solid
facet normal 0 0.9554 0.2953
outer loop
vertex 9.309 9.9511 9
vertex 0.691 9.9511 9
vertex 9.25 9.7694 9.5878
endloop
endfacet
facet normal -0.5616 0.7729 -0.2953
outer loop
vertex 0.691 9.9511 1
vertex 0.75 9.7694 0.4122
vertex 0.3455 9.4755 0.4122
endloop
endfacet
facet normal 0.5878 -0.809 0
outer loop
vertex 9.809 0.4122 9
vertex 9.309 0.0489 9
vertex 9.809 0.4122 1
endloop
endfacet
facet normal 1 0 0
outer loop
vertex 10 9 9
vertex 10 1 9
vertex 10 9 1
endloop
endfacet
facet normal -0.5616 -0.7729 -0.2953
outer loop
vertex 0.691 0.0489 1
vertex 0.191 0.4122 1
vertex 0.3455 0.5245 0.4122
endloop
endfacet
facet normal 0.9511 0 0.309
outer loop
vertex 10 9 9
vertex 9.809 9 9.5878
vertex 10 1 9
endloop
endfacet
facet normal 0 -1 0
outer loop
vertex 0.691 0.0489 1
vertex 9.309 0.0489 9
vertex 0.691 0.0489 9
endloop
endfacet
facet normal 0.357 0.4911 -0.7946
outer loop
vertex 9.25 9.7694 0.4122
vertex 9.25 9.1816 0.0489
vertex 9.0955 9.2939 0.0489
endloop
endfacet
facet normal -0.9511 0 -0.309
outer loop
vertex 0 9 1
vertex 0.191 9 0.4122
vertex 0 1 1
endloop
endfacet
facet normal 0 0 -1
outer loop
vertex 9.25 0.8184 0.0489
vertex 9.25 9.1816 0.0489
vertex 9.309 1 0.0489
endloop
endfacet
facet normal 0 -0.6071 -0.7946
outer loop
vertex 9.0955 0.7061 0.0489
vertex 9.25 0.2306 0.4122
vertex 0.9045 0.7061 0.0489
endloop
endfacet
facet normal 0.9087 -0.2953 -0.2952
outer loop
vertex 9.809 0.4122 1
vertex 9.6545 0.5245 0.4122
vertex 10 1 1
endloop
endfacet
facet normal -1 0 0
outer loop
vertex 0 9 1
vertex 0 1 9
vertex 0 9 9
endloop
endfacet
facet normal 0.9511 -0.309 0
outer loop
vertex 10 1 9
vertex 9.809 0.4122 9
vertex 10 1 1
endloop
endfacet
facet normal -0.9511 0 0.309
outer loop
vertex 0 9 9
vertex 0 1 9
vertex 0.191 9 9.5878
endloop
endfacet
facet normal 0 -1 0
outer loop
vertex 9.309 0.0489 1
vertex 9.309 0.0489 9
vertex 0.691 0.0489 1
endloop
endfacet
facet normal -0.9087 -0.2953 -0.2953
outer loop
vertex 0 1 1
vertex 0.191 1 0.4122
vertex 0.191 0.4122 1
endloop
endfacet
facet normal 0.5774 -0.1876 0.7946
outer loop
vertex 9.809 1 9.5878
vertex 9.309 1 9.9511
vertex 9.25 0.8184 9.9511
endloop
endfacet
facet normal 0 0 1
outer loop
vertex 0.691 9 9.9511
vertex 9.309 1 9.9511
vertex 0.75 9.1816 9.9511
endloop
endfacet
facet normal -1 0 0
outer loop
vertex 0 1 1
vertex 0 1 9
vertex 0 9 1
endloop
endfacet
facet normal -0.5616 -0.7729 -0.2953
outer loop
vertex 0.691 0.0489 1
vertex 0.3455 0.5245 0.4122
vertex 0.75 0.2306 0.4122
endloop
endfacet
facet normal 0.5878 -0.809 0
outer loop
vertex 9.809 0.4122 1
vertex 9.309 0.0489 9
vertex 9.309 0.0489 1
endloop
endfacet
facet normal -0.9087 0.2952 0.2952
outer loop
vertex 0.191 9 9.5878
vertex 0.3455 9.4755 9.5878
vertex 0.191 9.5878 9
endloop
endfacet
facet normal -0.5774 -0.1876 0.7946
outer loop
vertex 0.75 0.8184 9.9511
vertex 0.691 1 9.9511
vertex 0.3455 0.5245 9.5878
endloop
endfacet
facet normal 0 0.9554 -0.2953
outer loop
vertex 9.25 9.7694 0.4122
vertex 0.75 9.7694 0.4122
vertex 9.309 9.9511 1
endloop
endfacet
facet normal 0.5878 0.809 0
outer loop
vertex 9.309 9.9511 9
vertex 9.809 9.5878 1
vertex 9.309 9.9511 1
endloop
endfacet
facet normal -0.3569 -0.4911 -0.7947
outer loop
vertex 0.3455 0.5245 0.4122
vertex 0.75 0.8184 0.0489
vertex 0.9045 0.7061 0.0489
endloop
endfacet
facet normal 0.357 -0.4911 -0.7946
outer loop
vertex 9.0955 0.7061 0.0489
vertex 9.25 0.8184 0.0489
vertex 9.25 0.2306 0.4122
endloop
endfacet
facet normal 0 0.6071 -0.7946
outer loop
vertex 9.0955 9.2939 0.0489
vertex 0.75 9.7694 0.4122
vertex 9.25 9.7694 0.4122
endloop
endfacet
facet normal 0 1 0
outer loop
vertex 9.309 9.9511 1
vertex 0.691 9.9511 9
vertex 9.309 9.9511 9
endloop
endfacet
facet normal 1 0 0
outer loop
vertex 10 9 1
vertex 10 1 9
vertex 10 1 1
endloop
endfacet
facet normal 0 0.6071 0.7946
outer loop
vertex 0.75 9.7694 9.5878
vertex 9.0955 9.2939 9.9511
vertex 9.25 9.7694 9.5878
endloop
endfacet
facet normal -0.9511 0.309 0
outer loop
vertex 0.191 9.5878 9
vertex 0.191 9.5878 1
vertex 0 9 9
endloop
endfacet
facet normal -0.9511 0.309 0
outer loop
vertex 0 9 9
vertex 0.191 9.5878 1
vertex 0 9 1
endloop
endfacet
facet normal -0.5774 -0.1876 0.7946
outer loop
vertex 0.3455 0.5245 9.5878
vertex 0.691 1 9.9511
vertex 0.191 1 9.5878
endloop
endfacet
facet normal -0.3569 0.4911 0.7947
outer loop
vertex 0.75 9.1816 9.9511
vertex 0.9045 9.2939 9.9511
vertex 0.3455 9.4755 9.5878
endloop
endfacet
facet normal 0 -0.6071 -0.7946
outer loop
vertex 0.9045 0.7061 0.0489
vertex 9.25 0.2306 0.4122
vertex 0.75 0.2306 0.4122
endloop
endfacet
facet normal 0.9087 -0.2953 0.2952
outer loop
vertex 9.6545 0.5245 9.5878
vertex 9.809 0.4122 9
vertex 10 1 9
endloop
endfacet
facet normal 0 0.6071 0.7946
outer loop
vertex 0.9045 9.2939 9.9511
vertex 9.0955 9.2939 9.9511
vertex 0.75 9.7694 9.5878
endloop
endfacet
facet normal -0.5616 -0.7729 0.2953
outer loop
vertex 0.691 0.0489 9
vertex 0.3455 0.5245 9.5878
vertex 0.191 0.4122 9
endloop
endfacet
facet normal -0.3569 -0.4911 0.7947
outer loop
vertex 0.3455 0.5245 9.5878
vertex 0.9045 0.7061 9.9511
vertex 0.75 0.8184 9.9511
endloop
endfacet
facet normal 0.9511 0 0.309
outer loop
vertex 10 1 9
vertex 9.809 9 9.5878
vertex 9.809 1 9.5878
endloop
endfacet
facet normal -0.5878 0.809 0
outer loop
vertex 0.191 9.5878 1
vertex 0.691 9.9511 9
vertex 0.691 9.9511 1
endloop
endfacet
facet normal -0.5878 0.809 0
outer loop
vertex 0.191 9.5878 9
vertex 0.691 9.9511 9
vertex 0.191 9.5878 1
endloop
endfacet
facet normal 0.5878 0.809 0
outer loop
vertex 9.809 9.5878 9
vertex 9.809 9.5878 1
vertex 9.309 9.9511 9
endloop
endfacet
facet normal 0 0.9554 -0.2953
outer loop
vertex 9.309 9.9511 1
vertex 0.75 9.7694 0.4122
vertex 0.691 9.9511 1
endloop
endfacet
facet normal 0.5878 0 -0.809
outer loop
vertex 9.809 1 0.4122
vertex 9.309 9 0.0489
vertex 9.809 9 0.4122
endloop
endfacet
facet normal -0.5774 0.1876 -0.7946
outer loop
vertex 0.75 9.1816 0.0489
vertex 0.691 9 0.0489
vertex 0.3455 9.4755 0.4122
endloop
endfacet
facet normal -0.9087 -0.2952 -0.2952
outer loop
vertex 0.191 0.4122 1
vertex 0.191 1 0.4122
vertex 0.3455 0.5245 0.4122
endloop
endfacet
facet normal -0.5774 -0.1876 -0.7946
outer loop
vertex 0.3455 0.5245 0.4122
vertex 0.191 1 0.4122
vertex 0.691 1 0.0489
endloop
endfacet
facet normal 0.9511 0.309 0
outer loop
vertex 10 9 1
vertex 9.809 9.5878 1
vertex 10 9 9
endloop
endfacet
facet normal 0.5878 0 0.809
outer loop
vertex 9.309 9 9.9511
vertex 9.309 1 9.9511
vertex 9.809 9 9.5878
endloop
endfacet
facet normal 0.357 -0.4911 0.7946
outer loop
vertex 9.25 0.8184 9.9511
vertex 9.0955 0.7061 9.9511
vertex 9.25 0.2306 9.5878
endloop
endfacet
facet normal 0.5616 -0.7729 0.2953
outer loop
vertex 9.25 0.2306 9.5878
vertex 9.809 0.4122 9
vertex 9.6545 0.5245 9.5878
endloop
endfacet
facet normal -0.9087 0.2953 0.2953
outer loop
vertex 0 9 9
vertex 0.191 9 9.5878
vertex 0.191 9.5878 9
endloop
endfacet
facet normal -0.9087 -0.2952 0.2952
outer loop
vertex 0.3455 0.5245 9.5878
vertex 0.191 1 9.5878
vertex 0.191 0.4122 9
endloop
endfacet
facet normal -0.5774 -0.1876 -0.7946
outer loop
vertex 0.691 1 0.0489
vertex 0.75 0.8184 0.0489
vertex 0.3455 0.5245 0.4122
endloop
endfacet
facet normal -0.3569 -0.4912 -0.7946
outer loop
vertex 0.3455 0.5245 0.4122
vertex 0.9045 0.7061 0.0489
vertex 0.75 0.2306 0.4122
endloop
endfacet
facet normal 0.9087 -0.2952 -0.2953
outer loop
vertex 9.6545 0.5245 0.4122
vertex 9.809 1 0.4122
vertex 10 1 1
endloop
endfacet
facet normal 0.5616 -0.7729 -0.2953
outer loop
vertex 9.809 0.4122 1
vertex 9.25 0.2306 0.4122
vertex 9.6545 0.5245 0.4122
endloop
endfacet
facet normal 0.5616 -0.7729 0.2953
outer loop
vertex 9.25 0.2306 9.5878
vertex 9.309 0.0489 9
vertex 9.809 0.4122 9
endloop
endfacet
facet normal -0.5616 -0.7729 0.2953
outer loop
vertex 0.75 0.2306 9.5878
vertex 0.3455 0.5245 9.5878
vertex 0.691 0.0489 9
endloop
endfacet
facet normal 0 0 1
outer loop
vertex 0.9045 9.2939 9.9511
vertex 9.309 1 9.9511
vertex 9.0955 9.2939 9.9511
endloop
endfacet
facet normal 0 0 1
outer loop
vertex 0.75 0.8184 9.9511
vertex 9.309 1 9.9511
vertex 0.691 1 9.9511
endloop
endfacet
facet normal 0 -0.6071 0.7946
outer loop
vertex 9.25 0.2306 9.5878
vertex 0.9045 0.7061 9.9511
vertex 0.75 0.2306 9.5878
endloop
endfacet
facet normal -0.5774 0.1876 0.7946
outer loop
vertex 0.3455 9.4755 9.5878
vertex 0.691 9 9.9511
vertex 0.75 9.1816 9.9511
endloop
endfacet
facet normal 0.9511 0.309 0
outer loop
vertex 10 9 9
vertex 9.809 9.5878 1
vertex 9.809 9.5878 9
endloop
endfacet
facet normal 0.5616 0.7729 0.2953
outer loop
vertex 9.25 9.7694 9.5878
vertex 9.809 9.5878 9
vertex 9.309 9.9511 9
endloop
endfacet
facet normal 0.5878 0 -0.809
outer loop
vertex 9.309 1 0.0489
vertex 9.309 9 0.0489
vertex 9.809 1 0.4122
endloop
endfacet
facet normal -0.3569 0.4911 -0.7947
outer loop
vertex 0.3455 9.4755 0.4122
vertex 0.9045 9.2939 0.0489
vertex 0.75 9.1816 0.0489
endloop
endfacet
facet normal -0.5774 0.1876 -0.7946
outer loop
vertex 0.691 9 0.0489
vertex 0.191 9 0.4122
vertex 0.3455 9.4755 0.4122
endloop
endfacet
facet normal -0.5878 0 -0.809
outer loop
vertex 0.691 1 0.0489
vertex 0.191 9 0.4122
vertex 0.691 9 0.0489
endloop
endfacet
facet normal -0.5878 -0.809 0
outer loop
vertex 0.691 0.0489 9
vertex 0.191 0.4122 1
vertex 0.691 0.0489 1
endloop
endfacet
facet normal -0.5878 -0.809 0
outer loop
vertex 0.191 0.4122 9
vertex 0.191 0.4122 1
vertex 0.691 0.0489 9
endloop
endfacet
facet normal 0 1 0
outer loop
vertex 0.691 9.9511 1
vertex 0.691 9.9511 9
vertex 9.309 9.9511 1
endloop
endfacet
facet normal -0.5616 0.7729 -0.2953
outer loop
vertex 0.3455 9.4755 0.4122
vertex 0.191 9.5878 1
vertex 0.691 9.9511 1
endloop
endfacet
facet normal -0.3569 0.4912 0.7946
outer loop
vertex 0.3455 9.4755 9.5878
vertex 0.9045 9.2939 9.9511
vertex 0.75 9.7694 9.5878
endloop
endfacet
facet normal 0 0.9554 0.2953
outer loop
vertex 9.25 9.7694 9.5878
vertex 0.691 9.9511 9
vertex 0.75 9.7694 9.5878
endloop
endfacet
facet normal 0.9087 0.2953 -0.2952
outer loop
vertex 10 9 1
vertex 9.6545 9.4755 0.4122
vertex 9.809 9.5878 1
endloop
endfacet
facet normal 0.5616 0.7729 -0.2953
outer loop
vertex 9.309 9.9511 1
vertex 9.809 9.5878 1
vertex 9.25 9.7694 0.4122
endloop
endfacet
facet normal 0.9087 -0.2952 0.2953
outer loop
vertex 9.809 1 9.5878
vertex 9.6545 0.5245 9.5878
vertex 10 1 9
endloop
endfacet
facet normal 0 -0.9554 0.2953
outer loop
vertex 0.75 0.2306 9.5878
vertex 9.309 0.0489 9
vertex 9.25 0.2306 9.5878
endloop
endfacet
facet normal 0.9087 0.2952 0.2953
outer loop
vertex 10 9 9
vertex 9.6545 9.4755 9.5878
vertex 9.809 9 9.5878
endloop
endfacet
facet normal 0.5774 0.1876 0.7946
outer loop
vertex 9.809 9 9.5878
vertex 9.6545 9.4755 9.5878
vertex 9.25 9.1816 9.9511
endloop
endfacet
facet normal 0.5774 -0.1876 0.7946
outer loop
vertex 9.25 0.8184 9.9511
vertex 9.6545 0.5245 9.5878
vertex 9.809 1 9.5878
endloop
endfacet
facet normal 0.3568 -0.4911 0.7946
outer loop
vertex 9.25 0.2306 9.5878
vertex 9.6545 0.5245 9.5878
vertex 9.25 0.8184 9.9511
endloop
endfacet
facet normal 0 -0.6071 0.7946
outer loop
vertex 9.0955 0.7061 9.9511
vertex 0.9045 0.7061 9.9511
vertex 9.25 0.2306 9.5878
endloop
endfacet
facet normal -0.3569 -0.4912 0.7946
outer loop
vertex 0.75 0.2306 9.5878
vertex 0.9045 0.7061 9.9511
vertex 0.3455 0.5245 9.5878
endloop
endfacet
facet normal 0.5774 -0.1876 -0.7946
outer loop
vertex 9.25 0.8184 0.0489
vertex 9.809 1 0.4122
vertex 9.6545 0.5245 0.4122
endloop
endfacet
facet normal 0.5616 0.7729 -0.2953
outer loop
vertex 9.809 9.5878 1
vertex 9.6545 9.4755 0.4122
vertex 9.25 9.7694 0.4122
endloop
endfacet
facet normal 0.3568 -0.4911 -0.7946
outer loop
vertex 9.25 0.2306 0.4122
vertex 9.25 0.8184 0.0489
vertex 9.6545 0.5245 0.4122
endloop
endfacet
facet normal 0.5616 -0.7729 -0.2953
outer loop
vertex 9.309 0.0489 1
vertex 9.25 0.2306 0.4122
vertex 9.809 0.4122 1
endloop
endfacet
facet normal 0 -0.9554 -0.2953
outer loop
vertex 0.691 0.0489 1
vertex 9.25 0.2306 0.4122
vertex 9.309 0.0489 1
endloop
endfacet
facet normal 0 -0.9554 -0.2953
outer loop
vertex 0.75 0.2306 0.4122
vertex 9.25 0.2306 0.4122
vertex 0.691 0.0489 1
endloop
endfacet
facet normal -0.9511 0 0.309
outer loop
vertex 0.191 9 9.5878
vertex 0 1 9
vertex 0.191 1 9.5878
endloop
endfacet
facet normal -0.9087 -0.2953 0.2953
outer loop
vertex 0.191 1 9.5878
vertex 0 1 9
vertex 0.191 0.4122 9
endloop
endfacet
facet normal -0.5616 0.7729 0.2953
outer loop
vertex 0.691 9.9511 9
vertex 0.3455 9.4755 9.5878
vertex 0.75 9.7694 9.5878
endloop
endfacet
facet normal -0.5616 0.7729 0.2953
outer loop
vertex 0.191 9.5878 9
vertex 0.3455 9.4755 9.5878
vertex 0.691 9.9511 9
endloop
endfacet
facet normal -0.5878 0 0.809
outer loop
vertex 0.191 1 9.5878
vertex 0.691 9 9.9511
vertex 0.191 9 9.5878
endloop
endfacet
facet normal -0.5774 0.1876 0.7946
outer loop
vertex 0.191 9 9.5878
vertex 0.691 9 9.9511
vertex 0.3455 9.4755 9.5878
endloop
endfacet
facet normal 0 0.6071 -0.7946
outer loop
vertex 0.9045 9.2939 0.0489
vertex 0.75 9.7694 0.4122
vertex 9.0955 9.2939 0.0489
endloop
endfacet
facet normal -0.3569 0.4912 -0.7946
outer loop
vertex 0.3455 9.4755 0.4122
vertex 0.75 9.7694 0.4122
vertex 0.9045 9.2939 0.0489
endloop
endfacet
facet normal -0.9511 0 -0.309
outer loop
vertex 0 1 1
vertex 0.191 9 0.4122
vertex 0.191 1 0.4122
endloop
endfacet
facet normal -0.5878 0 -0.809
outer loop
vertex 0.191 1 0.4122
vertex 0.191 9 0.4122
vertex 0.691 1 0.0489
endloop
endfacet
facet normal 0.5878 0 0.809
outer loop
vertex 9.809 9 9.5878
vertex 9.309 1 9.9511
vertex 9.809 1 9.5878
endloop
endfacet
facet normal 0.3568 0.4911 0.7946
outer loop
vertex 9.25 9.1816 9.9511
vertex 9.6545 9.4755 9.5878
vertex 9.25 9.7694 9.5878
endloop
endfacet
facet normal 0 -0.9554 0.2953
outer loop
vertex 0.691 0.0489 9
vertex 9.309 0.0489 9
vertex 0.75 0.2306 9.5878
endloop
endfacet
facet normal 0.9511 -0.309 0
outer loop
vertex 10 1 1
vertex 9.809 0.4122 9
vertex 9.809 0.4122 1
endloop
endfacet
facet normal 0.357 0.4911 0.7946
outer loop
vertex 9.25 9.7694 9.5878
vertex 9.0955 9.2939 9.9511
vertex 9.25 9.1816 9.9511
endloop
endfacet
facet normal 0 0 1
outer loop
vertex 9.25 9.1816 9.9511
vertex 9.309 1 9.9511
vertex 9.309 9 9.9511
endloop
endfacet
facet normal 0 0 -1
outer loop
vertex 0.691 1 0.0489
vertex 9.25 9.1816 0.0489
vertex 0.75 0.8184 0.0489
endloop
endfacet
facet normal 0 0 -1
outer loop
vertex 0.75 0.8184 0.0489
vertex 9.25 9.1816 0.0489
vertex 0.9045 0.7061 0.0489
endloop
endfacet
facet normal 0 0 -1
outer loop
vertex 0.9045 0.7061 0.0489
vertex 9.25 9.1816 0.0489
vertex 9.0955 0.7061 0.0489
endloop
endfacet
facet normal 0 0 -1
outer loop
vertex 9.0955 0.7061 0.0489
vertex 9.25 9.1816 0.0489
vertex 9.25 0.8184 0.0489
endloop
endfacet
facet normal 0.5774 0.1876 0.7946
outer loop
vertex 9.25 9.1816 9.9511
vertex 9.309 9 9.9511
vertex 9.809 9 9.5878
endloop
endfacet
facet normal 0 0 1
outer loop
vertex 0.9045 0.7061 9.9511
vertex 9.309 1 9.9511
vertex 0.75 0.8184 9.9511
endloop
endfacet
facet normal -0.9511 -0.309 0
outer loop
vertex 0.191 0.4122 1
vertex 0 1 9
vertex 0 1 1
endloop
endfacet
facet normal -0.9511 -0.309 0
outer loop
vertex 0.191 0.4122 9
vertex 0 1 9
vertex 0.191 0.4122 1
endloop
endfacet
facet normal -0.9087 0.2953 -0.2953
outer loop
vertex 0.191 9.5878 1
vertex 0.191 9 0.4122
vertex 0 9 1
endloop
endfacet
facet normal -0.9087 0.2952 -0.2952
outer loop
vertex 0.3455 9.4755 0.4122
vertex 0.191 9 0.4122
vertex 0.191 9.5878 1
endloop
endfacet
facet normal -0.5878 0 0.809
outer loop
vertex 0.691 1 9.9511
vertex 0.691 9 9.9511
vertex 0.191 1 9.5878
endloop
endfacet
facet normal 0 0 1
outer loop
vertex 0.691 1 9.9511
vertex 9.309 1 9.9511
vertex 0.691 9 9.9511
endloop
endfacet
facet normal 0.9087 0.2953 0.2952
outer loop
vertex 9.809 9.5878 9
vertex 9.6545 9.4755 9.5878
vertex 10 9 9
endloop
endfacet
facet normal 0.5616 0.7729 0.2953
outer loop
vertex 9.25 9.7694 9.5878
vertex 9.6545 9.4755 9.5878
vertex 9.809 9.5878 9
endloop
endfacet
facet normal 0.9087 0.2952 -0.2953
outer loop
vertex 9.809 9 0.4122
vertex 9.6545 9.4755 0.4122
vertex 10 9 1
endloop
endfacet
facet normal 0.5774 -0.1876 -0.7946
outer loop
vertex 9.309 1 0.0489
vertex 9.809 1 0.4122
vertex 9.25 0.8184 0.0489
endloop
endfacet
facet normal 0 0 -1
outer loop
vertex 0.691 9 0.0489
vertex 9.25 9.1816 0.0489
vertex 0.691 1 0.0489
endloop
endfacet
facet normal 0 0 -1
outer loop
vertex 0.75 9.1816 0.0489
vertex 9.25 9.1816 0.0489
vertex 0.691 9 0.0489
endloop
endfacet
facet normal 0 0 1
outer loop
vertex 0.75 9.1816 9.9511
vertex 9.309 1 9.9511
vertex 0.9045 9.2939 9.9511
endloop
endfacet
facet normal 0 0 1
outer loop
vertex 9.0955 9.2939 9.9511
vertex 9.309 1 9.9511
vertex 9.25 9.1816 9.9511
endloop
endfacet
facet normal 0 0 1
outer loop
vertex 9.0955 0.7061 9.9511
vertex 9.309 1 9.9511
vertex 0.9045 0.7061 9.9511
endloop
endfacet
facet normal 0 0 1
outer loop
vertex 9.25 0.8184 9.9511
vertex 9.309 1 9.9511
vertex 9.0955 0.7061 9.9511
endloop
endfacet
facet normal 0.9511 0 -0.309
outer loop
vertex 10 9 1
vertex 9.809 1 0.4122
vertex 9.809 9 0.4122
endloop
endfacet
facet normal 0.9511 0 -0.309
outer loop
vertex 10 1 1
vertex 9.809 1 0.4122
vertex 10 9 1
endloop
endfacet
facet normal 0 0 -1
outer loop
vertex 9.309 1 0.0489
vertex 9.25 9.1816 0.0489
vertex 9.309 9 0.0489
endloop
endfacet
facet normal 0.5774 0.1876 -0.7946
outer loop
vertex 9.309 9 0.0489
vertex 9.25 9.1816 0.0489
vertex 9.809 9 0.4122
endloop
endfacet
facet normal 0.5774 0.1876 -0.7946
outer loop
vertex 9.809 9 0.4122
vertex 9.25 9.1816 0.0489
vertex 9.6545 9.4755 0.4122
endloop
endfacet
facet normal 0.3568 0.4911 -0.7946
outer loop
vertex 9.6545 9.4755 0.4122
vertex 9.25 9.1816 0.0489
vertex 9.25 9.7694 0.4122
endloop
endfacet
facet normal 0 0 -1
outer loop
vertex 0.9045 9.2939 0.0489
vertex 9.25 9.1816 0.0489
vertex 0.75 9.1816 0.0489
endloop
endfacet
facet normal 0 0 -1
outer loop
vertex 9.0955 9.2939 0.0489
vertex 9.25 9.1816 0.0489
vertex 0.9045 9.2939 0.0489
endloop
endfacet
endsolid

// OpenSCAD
module bcube(v, r = 1, fn = 10) {
    hull() {
        bcube_p(v, r=r, fn = fn);
    }
}

module bcube_p(v, r = 1, fn = 10) {
    echo("fn: ", fn);
    translate([r, r, r])
        sphere(r=r, $fn=fn);
    translate([v[0] - r, r, r])
        sphere(r=r, $fn=fn);
    translate([r, v[1] - r, r])
        sphere(r=r, $fn=fn);
    translate([v[0] - r, v[1] - r, r])
        sphere(r=r, $fn=fn);
    translate([r, r, v[2] - r])
        sphere(r=r, $fn=fn);
    translate([v[0] - r, r, v[2] - r])
        sphere(r=r, $fn=fn);
    translate([r, v[1] - r, v[2] - r])
        sphere(r=r, $fn=fn);
    translate([v[0] - r, v[1] - r, v[2] - r])
        sphere(r=r, $fn=fn);
}

$fn = 15;
bcube([10, 10, 10], r=1);
